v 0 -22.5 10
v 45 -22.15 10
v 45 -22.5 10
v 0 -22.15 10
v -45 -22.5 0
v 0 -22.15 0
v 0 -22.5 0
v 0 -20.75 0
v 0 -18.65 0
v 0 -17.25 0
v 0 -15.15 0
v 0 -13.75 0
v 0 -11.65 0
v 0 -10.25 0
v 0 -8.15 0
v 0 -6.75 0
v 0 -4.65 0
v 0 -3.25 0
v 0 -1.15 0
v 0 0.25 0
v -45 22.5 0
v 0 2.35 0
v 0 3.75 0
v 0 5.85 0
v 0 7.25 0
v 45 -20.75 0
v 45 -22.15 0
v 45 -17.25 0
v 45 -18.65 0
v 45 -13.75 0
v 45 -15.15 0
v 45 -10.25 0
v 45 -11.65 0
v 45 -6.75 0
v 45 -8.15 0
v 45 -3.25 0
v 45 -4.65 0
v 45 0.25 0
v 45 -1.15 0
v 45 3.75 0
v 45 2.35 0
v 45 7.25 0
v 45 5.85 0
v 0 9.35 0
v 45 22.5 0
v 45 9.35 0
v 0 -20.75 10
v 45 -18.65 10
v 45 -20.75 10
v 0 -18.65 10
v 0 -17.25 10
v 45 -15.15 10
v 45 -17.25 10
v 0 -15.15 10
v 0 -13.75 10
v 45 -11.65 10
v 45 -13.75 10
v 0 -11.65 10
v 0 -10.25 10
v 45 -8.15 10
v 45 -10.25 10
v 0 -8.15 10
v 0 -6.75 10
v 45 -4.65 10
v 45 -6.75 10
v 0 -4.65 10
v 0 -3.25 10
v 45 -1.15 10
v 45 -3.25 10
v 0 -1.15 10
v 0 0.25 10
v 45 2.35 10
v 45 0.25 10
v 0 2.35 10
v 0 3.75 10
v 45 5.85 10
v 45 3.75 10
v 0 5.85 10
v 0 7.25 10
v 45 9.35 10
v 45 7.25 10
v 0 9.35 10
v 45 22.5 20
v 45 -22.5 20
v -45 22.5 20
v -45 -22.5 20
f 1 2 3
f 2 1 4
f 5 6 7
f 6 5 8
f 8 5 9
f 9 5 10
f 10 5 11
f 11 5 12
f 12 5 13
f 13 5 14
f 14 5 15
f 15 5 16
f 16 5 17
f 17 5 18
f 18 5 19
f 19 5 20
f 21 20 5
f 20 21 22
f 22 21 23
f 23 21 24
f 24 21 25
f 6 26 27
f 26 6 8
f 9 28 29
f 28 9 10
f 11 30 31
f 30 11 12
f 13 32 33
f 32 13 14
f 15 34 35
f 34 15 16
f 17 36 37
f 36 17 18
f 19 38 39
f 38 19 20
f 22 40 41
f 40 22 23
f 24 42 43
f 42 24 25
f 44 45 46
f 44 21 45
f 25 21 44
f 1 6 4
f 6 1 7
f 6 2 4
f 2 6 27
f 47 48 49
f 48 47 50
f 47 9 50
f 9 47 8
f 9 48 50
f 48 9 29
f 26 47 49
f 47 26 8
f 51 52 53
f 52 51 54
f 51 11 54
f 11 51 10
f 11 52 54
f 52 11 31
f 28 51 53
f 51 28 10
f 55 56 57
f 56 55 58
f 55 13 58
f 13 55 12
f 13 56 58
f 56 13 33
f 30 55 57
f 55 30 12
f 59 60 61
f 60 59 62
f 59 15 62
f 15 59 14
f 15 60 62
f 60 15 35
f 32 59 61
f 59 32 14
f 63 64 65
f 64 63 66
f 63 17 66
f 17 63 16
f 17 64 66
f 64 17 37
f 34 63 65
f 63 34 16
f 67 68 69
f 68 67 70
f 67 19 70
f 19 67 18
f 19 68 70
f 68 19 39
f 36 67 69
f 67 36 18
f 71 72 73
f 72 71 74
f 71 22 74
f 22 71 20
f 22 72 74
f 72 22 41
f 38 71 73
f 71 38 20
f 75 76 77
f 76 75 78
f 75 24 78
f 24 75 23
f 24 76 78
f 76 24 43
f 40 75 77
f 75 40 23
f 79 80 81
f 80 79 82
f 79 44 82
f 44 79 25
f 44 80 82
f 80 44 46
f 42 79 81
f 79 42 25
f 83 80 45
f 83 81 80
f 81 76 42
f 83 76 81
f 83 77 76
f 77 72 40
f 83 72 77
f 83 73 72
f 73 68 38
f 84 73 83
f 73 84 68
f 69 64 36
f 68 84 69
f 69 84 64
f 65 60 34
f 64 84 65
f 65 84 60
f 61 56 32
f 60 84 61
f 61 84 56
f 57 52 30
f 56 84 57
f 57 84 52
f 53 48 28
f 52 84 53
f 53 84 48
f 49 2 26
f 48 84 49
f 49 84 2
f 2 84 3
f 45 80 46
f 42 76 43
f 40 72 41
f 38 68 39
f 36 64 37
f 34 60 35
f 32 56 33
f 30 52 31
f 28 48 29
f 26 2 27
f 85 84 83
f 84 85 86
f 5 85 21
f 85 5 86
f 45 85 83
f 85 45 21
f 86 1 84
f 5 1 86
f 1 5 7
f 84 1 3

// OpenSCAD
// Drying rack for microscope slides - a solid base block with a row of parallel slots open at the
// top, so slides standing on their long edge are half immersed in water and dry upright. NOVEL
// general part (a generic "slide rack" rather than any one lab's part).
//

slides   = 10;
slide_l  = 75;
slide_w  = 25;
slide_t  = 1;
base_l   = 90;
base_w   = 45;
base_h   = 20;
slot_l   = 77;
slot_w   = 1.6;
slot_d   = 10;
pitch    = 3.5;

$fn = 48;

slot_w_eff = slot_w + 0.5;   // open the cut so it doesn't bridge between pixels

difference() {
    translate([-base_l / 2, -base_w / 2, 0]) cube([base_l, base_w, base_h]);
    for (i = [0 : slides - 1])
        translate([0, -base_w / 2 - pitch / 2 + i * pitch, 0])
            cube([slot_l, slot_w_eff, slot_d]);
}
